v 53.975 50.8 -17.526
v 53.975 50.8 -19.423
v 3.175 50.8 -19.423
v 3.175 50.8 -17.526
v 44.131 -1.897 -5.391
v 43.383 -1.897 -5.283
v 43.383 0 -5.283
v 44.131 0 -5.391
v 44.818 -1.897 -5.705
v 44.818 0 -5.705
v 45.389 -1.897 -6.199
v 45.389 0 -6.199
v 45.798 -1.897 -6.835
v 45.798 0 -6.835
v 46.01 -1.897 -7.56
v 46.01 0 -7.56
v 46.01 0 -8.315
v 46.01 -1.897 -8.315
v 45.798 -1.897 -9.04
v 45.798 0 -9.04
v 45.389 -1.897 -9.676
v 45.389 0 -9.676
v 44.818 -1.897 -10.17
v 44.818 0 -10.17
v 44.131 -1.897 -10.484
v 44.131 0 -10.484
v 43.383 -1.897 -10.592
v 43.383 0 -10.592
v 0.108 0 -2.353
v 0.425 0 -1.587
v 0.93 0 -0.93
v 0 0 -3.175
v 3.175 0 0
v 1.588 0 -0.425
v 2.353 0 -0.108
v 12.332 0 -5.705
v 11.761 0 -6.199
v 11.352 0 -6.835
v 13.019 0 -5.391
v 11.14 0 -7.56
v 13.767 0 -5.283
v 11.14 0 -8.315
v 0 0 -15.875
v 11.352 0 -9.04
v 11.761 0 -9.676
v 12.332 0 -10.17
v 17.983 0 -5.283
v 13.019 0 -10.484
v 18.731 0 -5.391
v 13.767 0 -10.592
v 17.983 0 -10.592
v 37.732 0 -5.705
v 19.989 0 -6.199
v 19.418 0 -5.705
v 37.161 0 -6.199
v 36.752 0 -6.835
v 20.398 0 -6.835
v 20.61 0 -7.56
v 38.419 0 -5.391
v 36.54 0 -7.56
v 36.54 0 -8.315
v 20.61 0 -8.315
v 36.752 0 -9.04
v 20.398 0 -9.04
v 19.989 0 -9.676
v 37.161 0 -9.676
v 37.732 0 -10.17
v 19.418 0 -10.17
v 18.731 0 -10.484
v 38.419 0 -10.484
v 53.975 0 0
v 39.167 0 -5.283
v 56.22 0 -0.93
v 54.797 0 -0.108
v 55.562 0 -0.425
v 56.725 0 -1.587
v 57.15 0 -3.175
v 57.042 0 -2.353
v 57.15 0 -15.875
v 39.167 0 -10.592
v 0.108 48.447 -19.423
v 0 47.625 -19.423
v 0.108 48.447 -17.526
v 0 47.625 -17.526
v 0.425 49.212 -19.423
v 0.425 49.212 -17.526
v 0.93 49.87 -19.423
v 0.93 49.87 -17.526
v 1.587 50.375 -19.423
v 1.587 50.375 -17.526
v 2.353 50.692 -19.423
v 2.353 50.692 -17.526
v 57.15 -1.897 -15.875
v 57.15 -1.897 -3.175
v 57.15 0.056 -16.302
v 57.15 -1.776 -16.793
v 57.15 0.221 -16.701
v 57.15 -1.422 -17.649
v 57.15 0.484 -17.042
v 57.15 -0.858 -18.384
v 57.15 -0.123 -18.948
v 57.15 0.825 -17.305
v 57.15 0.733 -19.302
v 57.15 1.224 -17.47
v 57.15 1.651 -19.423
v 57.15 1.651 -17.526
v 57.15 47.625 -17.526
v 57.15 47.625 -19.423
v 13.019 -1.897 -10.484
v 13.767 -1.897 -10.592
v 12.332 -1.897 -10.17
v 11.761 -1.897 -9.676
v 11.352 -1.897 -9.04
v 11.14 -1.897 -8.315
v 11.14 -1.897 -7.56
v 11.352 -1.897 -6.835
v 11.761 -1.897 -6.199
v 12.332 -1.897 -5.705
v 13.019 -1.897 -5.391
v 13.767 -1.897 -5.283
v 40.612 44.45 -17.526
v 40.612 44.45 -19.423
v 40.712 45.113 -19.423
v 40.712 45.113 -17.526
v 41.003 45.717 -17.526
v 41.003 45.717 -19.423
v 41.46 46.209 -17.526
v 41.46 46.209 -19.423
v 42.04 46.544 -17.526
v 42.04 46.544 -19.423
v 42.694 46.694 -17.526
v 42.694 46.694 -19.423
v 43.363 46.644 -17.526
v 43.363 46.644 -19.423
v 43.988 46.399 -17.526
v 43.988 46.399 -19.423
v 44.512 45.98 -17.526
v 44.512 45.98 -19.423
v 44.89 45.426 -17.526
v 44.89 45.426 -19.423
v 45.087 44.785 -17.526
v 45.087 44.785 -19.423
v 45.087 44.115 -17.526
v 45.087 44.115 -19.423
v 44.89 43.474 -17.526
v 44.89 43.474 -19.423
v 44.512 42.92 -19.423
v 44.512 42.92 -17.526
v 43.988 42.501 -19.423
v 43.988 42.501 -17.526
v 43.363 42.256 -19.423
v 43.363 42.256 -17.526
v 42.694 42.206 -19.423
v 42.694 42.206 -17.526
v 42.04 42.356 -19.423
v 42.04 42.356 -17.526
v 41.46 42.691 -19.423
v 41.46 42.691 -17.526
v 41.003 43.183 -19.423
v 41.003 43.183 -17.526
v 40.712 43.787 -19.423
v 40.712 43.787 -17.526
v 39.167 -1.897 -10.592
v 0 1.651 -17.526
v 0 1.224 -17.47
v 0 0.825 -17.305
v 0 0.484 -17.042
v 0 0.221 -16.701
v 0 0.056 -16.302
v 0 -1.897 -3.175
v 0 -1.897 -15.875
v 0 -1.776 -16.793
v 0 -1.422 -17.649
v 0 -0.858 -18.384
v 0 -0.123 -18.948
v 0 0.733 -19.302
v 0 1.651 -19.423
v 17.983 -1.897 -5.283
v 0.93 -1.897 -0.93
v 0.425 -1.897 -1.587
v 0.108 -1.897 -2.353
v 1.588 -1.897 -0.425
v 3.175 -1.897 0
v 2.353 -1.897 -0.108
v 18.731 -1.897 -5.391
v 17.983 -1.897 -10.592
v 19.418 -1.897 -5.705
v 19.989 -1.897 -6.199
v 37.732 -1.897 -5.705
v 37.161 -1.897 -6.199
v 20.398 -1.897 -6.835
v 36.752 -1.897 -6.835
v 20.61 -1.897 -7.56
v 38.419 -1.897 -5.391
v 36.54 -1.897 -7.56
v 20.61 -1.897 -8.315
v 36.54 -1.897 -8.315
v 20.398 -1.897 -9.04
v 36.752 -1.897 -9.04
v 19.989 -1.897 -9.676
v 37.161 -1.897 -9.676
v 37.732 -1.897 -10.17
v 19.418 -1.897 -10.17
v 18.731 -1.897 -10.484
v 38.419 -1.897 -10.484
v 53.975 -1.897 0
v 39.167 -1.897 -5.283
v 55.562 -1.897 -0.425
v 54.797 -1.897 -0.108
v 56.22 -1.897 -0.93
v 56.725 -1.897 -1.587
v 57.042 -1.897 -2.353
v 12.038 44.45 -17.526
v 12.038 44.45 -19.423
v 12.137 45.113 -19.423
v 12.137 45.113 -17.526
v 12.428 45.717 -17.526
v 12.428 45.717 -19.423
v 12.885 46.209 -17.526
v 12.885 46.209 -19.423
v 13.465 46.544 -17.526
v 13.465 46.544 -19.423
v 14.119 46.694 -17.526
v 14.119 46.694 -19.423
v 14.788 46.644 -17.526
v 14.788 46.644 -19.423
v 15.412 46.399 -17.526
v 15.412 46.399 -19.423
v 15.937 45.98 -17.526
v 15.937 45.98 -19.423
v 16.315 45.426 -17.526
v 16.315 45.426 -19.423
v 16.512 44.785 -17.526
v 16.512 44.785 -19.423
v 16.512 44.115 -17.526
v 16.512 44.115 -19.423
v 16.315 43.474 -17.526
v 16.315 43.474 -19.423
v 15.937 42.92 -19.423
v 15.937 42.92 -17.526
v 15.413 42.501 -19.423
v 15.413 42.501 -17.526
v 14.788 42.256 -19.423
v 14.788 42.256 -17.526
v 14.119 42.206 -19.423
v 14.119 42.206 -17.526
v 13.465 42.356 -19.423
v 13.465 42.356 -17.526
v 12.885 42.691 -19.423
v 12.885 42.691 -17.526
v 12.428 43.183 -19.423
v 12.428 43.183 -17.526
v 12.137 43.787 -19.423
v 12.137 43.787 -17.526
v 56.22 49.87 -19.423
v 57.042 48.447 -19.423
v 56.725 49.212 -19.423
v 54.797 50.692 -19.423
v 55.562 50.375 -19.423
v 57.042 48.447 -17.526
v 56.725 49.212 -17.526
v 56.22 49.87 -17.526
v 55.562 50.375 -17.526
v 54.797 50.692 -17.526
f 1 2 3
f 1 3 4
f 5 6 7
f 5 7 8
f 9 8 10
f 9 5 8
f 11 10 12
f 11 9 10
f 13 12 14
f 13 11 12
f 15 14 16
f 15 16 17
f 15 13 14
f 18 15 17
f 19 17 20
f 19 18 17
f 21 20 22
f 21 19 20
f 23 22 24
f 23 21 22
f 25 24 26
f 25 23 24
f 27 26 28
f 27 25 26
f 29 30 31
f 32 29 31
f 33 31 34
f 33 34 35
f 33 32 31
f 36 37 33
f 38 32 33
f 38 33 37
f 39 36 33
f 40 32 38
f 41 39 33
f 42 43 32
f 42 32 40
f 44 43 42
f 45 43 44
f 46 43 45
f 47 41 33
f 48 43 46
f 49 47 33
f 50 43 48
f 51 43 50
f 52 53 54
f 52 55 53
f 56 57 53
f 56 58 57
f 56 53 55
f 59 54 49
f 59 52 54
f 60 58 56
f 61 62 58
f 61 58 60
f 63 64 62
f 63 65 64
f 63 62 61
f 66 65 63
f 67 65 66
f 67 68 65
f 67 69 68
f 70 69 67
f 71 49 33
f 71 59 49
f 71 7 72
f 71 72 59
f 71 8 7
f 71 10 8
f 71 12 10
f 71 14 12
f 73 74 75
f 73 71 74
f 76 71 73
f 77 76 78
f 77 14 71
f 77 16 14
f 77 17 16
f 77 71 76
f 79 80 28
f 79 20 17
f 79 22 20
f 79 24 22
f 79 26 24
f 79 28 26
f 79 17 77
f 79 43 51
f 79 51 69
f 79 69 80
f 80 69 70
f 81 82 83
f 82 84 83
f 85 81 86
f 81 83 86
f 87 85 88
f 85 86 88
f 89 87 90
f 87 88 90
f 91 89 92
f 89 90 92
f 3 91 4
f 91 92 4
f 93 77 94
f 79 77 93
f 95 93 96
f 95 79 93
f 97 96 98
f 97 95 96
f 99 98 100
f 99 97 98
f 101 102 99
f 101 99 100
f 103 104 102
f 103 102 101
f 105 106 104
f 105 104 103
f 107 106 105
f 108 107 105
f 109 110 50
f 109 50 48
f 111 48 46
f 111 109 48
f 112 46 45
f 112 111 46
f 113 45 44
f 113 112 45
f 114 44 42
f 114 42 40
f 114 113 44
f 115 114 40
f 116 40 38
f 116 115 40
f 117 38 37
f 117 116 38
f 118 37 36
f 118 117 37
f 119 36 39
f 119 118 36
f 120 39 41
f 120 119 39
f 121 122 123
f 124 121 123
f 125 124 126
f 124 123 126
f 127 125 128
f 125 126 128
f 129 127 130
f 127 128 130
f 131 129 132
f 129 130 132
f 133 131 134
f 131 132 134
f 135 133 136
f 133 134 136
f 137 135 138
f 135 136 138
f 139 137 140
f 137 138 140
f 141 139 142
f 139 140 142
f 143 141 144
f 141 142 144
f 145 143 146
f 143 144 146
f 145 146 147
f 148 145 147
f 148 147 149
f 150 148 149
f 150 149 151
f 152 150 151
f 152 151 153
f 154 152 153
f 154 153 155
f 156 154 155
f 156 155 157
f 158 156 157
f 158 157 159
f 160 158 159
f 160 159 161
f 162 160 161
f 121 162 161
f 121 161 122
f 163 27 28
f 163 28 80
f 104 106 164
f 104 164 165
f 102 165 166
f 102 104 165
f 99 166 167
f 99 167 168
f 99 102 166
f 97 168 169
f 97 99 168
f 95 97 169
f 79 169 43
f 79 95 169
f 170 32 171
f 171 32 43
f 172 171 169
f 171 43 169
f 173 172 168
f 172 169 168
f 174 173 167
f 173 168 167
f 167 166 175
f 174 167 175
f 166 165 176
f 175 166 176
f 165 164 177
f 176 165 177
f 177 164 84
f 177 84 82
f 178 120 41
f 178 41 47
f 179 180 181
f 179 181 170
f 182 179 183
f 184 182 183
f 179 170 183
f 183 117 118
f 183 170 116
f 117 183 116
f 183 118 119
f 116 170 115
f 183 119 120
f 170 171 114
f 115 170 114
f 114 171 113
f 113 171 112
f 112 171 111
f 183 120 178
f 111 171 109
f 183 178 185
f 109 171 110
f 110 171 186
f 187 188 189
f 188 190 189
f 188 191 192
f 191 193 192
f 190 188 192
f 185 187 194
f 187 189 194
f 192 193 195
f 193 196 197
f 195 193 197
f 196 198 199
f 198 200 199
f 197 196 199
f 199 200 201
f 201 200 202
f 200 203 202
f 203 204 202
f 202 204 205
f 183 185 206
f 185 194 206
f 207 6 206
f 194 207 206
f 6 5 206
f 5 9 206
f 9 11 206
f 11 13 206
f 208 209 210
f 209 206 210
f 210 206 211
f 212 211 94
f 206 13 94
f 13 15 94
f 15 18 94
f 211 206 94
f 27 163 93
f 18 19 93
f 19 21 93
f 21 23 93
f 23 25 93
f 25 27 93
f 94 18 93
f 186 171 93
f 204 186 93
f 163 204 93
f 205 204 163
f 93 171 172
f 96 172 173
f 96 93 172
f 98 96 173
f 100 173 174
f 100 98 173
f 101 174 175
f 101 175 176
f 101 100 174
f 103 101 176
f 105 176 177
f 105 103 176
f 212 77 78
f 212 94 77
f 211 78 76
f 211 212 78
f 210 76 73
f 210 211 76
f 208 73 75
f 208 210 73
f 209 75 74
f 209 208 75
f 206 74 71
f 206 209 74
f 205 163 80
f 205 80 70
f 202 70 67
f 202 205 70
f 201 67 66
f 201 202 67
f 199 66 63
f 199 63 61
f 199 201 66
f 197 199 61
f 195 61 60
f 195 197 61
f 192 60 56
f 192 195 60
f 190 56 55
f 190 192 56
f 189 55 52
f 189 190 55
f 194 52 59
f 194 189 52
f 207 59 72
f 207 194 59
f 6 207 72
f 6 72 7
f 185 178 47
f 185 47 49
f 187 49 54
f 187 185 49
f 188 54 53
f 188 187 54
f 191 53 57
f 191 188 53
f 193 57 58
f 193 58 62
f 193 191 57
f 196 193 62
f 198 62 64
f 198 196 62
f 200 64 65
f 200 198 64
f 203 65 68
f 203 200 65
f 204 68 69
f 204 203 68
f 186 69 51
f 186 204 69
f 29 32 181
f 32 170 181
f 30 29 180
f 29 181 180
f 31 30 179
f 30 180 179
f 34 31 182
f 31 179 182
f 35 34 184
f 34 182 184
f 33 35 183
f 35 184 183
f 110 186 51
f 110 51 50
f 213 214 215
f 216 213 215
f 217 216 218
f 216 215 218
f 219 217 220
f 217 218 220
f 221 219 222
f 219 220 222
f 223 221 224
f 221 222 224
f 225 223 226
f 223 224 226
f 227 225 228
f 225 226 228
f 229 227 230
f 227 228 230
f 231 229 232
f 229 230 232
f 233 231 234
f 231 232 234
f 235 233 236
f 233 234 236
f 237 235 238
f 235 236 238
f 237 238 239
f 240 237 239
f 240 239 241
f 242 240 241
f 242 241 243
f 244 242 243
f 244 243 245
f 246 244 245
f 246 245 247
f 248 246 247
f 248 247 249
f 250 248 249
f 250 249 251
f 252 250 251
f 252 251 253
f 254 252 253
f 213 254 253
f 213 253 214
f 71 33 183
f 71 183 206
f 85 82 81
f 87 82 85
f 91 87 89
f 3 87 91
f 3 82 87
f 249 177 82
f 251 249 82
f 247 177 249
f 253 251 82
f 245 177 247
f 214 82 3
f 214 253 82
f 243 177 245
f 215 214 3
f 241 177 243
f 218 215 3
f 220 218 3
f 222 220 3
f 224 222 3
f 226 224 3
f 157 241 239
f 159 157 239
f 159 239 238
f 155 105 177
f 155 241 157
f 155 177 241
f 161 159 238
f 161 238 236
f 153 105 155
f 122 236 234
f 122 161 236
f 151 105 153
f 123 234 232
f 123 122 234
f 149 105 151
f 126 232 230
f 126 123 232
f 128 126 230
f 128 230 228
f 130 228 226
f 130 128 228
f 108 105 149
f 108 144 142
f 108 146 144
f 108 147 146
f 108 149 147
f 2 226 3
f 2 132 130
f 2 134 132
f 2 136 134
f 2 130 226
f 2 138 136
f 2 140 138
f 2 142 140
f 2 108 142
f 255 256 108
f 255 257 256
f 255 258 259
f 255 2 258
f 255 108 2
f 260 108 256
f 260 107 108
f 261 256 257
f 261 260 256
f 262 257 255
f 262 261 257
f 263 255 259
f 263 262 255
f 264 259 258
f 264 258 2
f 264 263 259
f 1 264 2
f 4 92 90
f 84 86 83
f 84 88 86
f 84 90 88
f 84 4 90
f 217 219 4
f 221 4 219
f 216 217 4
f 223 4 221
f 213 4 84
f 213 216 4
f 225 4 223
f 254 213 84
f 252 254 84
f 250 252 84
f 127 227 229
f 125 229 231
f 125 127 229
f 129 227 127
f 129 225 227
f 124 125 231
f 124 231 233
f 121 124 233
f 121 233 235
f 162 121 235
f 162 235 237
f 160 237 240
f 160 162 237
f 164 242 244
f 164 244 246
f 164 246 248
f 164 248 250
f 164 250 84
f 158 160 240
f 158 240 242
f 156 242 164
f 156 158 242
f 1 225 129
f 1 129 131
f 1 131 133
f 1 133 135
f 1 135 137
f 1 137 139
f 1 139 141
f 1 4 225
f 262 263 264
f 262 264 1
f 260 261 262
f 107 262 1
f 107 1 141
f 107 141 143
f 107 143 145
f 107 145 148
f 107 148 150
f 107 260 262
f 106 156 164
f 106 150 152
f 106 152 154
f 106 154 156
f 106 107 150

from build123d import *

# Parameters (mm, degrees)
SKETCH1_W                      = 57.15
SKETCH1_H                      = 15.875
BASE_FLANGE1_DEPTH             = 1.89738
EDGE_FLANGE1_DEPTH             = 57.15
F_4_START                      = -1.89738
F_4_0_209_DIAMETER_SLOT1_DEPTH = 1.89738
F_4_5_4_5_DIAMETER_HOLE1_D     = 4.5
FILLET1_R                      = 3.175


# Read off the part's stored shape, not the designer's step: #4 (0.209) Diameter Slot1
# Sheet-metal steps are written as plain solids
with BuildPart() as part:
    # Sketch1 → Base-Flange1 (new body)
    with BuildSketch(Plane(origin=(0, 0, 0), x_dir=(1, 0, 0), z_dir=(0, 1, 0))):
        with Locations((28.575, 7.9375)):
            Rectangle(SKETCH1_W, SKETCH1_H)
    extrude(amount=-BASE_FLANGE1_DEPTH)

    # Edge-Flange1 section (across the edge) → Edge-Flange1 (add)
    with BuildSketch(Plane(origin=(57.15, 0, -17.526), x_dir=(0, 0, 1), z_dir=(-1, 0, 0))):
        with BuildLine():
            Line((-1.89738, 1.651), (-1.89738, 50.8))
            Line((-1.89738, 50.8), (0, 50.8))
            Line((0, 50.8), (0, 1.651))
            ThreePointArc((0, 1.651), (0.483566704, 0.483566704), (1.651, 0))
            Line((1.651, 0), (1.651, -1.89738))
            ThreePointArc((1.651, -1.89738), (-0.85808356, -0.85808356), (-1.89738, 1.651))
        make_face()
    extrude(amount=EDGE_FLANGE1_DEPTH)

    # #4 (0.209) Diameter Slot1 outline → #4 (0.209) Diameter Slot1 (cut)
    with BuildSketch(Plane(origin=(0, 0, 0), x_dir=(1, 0, 0), z_dir=(0, 1, 0)).offset(F_4_START)):
        with BuildLine():
            Line((39.1668, 5.2832), (43.3832, 5.2832))
            ThreePointArc((43.3832, 5.2832), (46.0375, 7.9375), (43.3832, 10.5918))
            Line((43.3832, 10.5918), (39.1668, 10.5918))
            ThreePointArc((39.1668, 10.5918), (36.5125, 7.9375), (39.1668, 5.2832))
        make_face()
        with BuildLine():
            ThreePointArc((17.9832, 5.2832), (20.6375, 7.9375), (17.9832, 10.5918))
            Line((17.9832, 10.5918), (13.7668, 10.5918))
            ThreePointArc((13.7668, 10.5918), (11.1125, 7.9375), (13.7668, 5.2832))
            Line((13.7668, 5.2832), (17.9832, 5.2832))
        make_face()
    extrude(amount=F_4_0_209_DIAMETER_SLOT1_DEPTH, mode=Mode.SUBTRACT)

    # Ø4.5 (4.5) Diameter Hole1 (through all)
    with Locations(Plane.XY.offset(-17.526)):
        with Locations((14.2875, 44.45), (42.8625, 44.45)):
            Hole(F_4_5_4_5_DIAMETER_HOLE1_D / 2)

    # Fillet1
    fillet1_edges = [part.edges().sort_by_distance(p)[0] for p in [
        (57.15, 50.8, -18.47469),
        (0, 50.8, -18.47469),
        (57.15, -0.94869, 0),
        (0, -0.94869, 0),
    ]]
    fillet(fillet1_edges, radius=FILLET1_R)


solid = part.part
